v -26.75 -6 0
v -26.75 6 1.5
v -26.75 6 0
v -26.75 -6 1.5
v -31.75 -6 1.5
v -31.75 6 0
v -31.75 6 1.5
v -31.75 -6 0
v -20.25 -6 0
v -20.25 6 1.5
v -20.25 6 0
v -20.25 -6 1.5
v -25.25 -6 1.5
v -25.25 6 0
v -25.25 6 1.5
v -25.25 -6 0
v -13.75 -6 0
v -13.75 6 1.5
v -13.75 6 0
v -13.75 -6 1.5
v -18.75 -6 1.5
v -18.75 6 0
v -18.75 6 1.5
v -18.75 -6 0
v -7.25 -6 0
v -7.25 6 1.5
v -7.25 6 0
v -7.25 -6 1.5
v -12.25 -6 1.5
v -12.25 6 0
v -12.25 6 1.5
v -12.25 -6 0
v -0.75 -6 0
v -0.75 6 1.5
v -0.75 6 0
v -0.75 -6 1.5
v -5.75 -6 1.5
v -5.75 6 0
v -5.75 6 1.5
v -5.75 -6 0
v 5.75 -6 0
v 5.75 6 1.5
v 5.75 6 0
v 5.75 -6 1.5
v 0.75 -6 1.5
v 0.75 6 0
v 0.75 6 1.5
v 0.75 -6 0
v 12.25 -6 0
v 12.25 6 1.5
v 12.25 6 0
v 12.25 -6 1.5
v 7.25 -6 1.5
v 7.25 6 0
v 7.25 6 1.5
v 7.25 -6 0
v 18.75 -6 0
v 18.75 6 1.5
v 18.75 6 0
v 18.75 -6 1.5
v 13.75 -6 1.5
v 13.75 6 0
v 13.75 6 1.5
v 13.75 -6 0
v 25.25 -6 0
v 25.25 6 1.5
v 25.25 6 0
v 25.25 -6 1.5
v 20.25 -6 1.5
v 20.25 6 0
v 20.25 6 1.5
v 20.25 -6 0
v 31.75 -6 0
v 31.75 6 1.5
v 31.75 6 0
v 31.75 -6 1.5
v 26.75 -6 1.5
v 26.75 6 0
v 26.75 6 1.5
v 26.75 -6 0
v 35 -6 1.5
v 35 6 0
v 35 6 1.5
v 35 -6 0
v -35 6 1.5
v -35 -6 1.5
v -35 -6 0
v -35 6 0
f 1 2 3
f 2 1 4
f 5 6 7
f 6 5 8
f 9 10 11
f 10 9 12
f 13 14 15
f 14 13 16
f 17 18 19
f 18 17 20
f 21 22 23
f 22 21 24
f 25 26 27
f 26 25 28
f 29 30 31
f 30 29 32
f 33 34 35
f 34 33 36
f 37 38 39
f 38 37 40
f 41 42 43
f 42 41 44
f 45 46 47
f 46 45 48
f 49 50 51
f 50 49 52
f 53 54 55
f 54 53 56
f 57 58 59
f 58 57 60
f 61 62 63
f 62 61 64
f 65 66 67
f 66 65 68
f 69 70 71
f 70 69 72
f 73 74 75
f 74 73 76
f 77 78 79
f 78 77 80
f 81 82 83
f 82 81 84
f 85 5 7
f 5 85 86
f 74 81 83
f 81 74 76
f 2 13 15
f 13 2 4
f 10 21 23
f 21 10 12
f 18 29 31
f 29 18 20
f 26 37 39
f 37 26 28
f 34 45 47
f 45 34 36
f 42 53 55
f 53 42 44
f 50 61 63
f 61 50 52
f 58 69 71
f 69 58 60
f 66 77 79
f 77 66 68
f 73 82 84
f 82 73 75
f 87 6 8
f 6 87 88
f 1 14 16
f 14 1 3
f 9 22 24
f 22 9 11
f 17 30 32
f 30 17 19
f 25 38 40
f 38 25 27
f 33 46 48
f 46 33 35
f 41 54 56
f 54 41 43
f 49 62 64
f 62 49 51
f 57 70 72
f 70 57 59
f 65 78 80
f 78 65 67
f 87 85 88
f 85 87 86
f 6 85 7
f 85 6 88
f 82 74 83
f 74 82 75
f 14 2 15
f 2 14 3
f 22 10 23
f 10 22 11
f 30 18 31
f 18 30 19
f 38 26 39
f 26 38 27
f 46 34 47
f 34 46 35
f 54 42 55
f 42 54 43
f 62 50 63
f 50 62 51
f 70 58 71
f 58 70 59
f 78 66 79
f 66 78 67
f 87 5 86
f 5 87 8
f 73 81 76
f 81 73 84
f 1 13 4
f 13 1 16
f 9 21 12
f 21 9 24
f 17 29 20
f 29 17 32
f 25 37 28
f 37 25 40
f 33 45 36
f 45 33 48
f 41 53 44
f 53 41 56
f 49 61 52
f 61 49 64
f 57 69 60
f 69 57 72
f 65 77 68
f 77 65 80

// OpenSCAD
// 10-well comb for casting agarose gels
// Print orientation: flat on bed, teeth pointing down (-Y)

// ---- Dimensions (mm) ----
plate_t      = 1.5;   // plate thickness (Z)
spine_len    = 70;    // spine length (X)
spine_w      = 12;    // spine width (Y)
tooth_w      = 5.0;   // tooth width (X)
tooth_len    = 12;    // tooth length (Y)
tooth_count  = 10;    // number of teeth
gap          = 1.5;   // gap between teeth (X)
eps          = 0.5;   // cutter overshoot past faces

// ---- Derived ----
pitch   = tooth_w + gap;          // centre-to-centre spacing of teeth
x_start = -(tooth_count - 1) * pitch / 2;  // first tooth centre (row centred on spine)

// ---- Model ----
difference() {
    // Base plate with spine
    translate([-spine_len / 2, -spine_w / 2, 0])
        cube([spine_len, spine_w, plate_t]);

    // Teeth cut out from the plate
    for (i = [0 : tooth_count - 1])
        translate([x_start + i * pitch - tooth_w / 2,
                   -tooth_len / 2 - eps,
                   -eps])
            cube([tooth_w, tooth_len + 2 * eps, plate_t + 2 * eps]);
}
